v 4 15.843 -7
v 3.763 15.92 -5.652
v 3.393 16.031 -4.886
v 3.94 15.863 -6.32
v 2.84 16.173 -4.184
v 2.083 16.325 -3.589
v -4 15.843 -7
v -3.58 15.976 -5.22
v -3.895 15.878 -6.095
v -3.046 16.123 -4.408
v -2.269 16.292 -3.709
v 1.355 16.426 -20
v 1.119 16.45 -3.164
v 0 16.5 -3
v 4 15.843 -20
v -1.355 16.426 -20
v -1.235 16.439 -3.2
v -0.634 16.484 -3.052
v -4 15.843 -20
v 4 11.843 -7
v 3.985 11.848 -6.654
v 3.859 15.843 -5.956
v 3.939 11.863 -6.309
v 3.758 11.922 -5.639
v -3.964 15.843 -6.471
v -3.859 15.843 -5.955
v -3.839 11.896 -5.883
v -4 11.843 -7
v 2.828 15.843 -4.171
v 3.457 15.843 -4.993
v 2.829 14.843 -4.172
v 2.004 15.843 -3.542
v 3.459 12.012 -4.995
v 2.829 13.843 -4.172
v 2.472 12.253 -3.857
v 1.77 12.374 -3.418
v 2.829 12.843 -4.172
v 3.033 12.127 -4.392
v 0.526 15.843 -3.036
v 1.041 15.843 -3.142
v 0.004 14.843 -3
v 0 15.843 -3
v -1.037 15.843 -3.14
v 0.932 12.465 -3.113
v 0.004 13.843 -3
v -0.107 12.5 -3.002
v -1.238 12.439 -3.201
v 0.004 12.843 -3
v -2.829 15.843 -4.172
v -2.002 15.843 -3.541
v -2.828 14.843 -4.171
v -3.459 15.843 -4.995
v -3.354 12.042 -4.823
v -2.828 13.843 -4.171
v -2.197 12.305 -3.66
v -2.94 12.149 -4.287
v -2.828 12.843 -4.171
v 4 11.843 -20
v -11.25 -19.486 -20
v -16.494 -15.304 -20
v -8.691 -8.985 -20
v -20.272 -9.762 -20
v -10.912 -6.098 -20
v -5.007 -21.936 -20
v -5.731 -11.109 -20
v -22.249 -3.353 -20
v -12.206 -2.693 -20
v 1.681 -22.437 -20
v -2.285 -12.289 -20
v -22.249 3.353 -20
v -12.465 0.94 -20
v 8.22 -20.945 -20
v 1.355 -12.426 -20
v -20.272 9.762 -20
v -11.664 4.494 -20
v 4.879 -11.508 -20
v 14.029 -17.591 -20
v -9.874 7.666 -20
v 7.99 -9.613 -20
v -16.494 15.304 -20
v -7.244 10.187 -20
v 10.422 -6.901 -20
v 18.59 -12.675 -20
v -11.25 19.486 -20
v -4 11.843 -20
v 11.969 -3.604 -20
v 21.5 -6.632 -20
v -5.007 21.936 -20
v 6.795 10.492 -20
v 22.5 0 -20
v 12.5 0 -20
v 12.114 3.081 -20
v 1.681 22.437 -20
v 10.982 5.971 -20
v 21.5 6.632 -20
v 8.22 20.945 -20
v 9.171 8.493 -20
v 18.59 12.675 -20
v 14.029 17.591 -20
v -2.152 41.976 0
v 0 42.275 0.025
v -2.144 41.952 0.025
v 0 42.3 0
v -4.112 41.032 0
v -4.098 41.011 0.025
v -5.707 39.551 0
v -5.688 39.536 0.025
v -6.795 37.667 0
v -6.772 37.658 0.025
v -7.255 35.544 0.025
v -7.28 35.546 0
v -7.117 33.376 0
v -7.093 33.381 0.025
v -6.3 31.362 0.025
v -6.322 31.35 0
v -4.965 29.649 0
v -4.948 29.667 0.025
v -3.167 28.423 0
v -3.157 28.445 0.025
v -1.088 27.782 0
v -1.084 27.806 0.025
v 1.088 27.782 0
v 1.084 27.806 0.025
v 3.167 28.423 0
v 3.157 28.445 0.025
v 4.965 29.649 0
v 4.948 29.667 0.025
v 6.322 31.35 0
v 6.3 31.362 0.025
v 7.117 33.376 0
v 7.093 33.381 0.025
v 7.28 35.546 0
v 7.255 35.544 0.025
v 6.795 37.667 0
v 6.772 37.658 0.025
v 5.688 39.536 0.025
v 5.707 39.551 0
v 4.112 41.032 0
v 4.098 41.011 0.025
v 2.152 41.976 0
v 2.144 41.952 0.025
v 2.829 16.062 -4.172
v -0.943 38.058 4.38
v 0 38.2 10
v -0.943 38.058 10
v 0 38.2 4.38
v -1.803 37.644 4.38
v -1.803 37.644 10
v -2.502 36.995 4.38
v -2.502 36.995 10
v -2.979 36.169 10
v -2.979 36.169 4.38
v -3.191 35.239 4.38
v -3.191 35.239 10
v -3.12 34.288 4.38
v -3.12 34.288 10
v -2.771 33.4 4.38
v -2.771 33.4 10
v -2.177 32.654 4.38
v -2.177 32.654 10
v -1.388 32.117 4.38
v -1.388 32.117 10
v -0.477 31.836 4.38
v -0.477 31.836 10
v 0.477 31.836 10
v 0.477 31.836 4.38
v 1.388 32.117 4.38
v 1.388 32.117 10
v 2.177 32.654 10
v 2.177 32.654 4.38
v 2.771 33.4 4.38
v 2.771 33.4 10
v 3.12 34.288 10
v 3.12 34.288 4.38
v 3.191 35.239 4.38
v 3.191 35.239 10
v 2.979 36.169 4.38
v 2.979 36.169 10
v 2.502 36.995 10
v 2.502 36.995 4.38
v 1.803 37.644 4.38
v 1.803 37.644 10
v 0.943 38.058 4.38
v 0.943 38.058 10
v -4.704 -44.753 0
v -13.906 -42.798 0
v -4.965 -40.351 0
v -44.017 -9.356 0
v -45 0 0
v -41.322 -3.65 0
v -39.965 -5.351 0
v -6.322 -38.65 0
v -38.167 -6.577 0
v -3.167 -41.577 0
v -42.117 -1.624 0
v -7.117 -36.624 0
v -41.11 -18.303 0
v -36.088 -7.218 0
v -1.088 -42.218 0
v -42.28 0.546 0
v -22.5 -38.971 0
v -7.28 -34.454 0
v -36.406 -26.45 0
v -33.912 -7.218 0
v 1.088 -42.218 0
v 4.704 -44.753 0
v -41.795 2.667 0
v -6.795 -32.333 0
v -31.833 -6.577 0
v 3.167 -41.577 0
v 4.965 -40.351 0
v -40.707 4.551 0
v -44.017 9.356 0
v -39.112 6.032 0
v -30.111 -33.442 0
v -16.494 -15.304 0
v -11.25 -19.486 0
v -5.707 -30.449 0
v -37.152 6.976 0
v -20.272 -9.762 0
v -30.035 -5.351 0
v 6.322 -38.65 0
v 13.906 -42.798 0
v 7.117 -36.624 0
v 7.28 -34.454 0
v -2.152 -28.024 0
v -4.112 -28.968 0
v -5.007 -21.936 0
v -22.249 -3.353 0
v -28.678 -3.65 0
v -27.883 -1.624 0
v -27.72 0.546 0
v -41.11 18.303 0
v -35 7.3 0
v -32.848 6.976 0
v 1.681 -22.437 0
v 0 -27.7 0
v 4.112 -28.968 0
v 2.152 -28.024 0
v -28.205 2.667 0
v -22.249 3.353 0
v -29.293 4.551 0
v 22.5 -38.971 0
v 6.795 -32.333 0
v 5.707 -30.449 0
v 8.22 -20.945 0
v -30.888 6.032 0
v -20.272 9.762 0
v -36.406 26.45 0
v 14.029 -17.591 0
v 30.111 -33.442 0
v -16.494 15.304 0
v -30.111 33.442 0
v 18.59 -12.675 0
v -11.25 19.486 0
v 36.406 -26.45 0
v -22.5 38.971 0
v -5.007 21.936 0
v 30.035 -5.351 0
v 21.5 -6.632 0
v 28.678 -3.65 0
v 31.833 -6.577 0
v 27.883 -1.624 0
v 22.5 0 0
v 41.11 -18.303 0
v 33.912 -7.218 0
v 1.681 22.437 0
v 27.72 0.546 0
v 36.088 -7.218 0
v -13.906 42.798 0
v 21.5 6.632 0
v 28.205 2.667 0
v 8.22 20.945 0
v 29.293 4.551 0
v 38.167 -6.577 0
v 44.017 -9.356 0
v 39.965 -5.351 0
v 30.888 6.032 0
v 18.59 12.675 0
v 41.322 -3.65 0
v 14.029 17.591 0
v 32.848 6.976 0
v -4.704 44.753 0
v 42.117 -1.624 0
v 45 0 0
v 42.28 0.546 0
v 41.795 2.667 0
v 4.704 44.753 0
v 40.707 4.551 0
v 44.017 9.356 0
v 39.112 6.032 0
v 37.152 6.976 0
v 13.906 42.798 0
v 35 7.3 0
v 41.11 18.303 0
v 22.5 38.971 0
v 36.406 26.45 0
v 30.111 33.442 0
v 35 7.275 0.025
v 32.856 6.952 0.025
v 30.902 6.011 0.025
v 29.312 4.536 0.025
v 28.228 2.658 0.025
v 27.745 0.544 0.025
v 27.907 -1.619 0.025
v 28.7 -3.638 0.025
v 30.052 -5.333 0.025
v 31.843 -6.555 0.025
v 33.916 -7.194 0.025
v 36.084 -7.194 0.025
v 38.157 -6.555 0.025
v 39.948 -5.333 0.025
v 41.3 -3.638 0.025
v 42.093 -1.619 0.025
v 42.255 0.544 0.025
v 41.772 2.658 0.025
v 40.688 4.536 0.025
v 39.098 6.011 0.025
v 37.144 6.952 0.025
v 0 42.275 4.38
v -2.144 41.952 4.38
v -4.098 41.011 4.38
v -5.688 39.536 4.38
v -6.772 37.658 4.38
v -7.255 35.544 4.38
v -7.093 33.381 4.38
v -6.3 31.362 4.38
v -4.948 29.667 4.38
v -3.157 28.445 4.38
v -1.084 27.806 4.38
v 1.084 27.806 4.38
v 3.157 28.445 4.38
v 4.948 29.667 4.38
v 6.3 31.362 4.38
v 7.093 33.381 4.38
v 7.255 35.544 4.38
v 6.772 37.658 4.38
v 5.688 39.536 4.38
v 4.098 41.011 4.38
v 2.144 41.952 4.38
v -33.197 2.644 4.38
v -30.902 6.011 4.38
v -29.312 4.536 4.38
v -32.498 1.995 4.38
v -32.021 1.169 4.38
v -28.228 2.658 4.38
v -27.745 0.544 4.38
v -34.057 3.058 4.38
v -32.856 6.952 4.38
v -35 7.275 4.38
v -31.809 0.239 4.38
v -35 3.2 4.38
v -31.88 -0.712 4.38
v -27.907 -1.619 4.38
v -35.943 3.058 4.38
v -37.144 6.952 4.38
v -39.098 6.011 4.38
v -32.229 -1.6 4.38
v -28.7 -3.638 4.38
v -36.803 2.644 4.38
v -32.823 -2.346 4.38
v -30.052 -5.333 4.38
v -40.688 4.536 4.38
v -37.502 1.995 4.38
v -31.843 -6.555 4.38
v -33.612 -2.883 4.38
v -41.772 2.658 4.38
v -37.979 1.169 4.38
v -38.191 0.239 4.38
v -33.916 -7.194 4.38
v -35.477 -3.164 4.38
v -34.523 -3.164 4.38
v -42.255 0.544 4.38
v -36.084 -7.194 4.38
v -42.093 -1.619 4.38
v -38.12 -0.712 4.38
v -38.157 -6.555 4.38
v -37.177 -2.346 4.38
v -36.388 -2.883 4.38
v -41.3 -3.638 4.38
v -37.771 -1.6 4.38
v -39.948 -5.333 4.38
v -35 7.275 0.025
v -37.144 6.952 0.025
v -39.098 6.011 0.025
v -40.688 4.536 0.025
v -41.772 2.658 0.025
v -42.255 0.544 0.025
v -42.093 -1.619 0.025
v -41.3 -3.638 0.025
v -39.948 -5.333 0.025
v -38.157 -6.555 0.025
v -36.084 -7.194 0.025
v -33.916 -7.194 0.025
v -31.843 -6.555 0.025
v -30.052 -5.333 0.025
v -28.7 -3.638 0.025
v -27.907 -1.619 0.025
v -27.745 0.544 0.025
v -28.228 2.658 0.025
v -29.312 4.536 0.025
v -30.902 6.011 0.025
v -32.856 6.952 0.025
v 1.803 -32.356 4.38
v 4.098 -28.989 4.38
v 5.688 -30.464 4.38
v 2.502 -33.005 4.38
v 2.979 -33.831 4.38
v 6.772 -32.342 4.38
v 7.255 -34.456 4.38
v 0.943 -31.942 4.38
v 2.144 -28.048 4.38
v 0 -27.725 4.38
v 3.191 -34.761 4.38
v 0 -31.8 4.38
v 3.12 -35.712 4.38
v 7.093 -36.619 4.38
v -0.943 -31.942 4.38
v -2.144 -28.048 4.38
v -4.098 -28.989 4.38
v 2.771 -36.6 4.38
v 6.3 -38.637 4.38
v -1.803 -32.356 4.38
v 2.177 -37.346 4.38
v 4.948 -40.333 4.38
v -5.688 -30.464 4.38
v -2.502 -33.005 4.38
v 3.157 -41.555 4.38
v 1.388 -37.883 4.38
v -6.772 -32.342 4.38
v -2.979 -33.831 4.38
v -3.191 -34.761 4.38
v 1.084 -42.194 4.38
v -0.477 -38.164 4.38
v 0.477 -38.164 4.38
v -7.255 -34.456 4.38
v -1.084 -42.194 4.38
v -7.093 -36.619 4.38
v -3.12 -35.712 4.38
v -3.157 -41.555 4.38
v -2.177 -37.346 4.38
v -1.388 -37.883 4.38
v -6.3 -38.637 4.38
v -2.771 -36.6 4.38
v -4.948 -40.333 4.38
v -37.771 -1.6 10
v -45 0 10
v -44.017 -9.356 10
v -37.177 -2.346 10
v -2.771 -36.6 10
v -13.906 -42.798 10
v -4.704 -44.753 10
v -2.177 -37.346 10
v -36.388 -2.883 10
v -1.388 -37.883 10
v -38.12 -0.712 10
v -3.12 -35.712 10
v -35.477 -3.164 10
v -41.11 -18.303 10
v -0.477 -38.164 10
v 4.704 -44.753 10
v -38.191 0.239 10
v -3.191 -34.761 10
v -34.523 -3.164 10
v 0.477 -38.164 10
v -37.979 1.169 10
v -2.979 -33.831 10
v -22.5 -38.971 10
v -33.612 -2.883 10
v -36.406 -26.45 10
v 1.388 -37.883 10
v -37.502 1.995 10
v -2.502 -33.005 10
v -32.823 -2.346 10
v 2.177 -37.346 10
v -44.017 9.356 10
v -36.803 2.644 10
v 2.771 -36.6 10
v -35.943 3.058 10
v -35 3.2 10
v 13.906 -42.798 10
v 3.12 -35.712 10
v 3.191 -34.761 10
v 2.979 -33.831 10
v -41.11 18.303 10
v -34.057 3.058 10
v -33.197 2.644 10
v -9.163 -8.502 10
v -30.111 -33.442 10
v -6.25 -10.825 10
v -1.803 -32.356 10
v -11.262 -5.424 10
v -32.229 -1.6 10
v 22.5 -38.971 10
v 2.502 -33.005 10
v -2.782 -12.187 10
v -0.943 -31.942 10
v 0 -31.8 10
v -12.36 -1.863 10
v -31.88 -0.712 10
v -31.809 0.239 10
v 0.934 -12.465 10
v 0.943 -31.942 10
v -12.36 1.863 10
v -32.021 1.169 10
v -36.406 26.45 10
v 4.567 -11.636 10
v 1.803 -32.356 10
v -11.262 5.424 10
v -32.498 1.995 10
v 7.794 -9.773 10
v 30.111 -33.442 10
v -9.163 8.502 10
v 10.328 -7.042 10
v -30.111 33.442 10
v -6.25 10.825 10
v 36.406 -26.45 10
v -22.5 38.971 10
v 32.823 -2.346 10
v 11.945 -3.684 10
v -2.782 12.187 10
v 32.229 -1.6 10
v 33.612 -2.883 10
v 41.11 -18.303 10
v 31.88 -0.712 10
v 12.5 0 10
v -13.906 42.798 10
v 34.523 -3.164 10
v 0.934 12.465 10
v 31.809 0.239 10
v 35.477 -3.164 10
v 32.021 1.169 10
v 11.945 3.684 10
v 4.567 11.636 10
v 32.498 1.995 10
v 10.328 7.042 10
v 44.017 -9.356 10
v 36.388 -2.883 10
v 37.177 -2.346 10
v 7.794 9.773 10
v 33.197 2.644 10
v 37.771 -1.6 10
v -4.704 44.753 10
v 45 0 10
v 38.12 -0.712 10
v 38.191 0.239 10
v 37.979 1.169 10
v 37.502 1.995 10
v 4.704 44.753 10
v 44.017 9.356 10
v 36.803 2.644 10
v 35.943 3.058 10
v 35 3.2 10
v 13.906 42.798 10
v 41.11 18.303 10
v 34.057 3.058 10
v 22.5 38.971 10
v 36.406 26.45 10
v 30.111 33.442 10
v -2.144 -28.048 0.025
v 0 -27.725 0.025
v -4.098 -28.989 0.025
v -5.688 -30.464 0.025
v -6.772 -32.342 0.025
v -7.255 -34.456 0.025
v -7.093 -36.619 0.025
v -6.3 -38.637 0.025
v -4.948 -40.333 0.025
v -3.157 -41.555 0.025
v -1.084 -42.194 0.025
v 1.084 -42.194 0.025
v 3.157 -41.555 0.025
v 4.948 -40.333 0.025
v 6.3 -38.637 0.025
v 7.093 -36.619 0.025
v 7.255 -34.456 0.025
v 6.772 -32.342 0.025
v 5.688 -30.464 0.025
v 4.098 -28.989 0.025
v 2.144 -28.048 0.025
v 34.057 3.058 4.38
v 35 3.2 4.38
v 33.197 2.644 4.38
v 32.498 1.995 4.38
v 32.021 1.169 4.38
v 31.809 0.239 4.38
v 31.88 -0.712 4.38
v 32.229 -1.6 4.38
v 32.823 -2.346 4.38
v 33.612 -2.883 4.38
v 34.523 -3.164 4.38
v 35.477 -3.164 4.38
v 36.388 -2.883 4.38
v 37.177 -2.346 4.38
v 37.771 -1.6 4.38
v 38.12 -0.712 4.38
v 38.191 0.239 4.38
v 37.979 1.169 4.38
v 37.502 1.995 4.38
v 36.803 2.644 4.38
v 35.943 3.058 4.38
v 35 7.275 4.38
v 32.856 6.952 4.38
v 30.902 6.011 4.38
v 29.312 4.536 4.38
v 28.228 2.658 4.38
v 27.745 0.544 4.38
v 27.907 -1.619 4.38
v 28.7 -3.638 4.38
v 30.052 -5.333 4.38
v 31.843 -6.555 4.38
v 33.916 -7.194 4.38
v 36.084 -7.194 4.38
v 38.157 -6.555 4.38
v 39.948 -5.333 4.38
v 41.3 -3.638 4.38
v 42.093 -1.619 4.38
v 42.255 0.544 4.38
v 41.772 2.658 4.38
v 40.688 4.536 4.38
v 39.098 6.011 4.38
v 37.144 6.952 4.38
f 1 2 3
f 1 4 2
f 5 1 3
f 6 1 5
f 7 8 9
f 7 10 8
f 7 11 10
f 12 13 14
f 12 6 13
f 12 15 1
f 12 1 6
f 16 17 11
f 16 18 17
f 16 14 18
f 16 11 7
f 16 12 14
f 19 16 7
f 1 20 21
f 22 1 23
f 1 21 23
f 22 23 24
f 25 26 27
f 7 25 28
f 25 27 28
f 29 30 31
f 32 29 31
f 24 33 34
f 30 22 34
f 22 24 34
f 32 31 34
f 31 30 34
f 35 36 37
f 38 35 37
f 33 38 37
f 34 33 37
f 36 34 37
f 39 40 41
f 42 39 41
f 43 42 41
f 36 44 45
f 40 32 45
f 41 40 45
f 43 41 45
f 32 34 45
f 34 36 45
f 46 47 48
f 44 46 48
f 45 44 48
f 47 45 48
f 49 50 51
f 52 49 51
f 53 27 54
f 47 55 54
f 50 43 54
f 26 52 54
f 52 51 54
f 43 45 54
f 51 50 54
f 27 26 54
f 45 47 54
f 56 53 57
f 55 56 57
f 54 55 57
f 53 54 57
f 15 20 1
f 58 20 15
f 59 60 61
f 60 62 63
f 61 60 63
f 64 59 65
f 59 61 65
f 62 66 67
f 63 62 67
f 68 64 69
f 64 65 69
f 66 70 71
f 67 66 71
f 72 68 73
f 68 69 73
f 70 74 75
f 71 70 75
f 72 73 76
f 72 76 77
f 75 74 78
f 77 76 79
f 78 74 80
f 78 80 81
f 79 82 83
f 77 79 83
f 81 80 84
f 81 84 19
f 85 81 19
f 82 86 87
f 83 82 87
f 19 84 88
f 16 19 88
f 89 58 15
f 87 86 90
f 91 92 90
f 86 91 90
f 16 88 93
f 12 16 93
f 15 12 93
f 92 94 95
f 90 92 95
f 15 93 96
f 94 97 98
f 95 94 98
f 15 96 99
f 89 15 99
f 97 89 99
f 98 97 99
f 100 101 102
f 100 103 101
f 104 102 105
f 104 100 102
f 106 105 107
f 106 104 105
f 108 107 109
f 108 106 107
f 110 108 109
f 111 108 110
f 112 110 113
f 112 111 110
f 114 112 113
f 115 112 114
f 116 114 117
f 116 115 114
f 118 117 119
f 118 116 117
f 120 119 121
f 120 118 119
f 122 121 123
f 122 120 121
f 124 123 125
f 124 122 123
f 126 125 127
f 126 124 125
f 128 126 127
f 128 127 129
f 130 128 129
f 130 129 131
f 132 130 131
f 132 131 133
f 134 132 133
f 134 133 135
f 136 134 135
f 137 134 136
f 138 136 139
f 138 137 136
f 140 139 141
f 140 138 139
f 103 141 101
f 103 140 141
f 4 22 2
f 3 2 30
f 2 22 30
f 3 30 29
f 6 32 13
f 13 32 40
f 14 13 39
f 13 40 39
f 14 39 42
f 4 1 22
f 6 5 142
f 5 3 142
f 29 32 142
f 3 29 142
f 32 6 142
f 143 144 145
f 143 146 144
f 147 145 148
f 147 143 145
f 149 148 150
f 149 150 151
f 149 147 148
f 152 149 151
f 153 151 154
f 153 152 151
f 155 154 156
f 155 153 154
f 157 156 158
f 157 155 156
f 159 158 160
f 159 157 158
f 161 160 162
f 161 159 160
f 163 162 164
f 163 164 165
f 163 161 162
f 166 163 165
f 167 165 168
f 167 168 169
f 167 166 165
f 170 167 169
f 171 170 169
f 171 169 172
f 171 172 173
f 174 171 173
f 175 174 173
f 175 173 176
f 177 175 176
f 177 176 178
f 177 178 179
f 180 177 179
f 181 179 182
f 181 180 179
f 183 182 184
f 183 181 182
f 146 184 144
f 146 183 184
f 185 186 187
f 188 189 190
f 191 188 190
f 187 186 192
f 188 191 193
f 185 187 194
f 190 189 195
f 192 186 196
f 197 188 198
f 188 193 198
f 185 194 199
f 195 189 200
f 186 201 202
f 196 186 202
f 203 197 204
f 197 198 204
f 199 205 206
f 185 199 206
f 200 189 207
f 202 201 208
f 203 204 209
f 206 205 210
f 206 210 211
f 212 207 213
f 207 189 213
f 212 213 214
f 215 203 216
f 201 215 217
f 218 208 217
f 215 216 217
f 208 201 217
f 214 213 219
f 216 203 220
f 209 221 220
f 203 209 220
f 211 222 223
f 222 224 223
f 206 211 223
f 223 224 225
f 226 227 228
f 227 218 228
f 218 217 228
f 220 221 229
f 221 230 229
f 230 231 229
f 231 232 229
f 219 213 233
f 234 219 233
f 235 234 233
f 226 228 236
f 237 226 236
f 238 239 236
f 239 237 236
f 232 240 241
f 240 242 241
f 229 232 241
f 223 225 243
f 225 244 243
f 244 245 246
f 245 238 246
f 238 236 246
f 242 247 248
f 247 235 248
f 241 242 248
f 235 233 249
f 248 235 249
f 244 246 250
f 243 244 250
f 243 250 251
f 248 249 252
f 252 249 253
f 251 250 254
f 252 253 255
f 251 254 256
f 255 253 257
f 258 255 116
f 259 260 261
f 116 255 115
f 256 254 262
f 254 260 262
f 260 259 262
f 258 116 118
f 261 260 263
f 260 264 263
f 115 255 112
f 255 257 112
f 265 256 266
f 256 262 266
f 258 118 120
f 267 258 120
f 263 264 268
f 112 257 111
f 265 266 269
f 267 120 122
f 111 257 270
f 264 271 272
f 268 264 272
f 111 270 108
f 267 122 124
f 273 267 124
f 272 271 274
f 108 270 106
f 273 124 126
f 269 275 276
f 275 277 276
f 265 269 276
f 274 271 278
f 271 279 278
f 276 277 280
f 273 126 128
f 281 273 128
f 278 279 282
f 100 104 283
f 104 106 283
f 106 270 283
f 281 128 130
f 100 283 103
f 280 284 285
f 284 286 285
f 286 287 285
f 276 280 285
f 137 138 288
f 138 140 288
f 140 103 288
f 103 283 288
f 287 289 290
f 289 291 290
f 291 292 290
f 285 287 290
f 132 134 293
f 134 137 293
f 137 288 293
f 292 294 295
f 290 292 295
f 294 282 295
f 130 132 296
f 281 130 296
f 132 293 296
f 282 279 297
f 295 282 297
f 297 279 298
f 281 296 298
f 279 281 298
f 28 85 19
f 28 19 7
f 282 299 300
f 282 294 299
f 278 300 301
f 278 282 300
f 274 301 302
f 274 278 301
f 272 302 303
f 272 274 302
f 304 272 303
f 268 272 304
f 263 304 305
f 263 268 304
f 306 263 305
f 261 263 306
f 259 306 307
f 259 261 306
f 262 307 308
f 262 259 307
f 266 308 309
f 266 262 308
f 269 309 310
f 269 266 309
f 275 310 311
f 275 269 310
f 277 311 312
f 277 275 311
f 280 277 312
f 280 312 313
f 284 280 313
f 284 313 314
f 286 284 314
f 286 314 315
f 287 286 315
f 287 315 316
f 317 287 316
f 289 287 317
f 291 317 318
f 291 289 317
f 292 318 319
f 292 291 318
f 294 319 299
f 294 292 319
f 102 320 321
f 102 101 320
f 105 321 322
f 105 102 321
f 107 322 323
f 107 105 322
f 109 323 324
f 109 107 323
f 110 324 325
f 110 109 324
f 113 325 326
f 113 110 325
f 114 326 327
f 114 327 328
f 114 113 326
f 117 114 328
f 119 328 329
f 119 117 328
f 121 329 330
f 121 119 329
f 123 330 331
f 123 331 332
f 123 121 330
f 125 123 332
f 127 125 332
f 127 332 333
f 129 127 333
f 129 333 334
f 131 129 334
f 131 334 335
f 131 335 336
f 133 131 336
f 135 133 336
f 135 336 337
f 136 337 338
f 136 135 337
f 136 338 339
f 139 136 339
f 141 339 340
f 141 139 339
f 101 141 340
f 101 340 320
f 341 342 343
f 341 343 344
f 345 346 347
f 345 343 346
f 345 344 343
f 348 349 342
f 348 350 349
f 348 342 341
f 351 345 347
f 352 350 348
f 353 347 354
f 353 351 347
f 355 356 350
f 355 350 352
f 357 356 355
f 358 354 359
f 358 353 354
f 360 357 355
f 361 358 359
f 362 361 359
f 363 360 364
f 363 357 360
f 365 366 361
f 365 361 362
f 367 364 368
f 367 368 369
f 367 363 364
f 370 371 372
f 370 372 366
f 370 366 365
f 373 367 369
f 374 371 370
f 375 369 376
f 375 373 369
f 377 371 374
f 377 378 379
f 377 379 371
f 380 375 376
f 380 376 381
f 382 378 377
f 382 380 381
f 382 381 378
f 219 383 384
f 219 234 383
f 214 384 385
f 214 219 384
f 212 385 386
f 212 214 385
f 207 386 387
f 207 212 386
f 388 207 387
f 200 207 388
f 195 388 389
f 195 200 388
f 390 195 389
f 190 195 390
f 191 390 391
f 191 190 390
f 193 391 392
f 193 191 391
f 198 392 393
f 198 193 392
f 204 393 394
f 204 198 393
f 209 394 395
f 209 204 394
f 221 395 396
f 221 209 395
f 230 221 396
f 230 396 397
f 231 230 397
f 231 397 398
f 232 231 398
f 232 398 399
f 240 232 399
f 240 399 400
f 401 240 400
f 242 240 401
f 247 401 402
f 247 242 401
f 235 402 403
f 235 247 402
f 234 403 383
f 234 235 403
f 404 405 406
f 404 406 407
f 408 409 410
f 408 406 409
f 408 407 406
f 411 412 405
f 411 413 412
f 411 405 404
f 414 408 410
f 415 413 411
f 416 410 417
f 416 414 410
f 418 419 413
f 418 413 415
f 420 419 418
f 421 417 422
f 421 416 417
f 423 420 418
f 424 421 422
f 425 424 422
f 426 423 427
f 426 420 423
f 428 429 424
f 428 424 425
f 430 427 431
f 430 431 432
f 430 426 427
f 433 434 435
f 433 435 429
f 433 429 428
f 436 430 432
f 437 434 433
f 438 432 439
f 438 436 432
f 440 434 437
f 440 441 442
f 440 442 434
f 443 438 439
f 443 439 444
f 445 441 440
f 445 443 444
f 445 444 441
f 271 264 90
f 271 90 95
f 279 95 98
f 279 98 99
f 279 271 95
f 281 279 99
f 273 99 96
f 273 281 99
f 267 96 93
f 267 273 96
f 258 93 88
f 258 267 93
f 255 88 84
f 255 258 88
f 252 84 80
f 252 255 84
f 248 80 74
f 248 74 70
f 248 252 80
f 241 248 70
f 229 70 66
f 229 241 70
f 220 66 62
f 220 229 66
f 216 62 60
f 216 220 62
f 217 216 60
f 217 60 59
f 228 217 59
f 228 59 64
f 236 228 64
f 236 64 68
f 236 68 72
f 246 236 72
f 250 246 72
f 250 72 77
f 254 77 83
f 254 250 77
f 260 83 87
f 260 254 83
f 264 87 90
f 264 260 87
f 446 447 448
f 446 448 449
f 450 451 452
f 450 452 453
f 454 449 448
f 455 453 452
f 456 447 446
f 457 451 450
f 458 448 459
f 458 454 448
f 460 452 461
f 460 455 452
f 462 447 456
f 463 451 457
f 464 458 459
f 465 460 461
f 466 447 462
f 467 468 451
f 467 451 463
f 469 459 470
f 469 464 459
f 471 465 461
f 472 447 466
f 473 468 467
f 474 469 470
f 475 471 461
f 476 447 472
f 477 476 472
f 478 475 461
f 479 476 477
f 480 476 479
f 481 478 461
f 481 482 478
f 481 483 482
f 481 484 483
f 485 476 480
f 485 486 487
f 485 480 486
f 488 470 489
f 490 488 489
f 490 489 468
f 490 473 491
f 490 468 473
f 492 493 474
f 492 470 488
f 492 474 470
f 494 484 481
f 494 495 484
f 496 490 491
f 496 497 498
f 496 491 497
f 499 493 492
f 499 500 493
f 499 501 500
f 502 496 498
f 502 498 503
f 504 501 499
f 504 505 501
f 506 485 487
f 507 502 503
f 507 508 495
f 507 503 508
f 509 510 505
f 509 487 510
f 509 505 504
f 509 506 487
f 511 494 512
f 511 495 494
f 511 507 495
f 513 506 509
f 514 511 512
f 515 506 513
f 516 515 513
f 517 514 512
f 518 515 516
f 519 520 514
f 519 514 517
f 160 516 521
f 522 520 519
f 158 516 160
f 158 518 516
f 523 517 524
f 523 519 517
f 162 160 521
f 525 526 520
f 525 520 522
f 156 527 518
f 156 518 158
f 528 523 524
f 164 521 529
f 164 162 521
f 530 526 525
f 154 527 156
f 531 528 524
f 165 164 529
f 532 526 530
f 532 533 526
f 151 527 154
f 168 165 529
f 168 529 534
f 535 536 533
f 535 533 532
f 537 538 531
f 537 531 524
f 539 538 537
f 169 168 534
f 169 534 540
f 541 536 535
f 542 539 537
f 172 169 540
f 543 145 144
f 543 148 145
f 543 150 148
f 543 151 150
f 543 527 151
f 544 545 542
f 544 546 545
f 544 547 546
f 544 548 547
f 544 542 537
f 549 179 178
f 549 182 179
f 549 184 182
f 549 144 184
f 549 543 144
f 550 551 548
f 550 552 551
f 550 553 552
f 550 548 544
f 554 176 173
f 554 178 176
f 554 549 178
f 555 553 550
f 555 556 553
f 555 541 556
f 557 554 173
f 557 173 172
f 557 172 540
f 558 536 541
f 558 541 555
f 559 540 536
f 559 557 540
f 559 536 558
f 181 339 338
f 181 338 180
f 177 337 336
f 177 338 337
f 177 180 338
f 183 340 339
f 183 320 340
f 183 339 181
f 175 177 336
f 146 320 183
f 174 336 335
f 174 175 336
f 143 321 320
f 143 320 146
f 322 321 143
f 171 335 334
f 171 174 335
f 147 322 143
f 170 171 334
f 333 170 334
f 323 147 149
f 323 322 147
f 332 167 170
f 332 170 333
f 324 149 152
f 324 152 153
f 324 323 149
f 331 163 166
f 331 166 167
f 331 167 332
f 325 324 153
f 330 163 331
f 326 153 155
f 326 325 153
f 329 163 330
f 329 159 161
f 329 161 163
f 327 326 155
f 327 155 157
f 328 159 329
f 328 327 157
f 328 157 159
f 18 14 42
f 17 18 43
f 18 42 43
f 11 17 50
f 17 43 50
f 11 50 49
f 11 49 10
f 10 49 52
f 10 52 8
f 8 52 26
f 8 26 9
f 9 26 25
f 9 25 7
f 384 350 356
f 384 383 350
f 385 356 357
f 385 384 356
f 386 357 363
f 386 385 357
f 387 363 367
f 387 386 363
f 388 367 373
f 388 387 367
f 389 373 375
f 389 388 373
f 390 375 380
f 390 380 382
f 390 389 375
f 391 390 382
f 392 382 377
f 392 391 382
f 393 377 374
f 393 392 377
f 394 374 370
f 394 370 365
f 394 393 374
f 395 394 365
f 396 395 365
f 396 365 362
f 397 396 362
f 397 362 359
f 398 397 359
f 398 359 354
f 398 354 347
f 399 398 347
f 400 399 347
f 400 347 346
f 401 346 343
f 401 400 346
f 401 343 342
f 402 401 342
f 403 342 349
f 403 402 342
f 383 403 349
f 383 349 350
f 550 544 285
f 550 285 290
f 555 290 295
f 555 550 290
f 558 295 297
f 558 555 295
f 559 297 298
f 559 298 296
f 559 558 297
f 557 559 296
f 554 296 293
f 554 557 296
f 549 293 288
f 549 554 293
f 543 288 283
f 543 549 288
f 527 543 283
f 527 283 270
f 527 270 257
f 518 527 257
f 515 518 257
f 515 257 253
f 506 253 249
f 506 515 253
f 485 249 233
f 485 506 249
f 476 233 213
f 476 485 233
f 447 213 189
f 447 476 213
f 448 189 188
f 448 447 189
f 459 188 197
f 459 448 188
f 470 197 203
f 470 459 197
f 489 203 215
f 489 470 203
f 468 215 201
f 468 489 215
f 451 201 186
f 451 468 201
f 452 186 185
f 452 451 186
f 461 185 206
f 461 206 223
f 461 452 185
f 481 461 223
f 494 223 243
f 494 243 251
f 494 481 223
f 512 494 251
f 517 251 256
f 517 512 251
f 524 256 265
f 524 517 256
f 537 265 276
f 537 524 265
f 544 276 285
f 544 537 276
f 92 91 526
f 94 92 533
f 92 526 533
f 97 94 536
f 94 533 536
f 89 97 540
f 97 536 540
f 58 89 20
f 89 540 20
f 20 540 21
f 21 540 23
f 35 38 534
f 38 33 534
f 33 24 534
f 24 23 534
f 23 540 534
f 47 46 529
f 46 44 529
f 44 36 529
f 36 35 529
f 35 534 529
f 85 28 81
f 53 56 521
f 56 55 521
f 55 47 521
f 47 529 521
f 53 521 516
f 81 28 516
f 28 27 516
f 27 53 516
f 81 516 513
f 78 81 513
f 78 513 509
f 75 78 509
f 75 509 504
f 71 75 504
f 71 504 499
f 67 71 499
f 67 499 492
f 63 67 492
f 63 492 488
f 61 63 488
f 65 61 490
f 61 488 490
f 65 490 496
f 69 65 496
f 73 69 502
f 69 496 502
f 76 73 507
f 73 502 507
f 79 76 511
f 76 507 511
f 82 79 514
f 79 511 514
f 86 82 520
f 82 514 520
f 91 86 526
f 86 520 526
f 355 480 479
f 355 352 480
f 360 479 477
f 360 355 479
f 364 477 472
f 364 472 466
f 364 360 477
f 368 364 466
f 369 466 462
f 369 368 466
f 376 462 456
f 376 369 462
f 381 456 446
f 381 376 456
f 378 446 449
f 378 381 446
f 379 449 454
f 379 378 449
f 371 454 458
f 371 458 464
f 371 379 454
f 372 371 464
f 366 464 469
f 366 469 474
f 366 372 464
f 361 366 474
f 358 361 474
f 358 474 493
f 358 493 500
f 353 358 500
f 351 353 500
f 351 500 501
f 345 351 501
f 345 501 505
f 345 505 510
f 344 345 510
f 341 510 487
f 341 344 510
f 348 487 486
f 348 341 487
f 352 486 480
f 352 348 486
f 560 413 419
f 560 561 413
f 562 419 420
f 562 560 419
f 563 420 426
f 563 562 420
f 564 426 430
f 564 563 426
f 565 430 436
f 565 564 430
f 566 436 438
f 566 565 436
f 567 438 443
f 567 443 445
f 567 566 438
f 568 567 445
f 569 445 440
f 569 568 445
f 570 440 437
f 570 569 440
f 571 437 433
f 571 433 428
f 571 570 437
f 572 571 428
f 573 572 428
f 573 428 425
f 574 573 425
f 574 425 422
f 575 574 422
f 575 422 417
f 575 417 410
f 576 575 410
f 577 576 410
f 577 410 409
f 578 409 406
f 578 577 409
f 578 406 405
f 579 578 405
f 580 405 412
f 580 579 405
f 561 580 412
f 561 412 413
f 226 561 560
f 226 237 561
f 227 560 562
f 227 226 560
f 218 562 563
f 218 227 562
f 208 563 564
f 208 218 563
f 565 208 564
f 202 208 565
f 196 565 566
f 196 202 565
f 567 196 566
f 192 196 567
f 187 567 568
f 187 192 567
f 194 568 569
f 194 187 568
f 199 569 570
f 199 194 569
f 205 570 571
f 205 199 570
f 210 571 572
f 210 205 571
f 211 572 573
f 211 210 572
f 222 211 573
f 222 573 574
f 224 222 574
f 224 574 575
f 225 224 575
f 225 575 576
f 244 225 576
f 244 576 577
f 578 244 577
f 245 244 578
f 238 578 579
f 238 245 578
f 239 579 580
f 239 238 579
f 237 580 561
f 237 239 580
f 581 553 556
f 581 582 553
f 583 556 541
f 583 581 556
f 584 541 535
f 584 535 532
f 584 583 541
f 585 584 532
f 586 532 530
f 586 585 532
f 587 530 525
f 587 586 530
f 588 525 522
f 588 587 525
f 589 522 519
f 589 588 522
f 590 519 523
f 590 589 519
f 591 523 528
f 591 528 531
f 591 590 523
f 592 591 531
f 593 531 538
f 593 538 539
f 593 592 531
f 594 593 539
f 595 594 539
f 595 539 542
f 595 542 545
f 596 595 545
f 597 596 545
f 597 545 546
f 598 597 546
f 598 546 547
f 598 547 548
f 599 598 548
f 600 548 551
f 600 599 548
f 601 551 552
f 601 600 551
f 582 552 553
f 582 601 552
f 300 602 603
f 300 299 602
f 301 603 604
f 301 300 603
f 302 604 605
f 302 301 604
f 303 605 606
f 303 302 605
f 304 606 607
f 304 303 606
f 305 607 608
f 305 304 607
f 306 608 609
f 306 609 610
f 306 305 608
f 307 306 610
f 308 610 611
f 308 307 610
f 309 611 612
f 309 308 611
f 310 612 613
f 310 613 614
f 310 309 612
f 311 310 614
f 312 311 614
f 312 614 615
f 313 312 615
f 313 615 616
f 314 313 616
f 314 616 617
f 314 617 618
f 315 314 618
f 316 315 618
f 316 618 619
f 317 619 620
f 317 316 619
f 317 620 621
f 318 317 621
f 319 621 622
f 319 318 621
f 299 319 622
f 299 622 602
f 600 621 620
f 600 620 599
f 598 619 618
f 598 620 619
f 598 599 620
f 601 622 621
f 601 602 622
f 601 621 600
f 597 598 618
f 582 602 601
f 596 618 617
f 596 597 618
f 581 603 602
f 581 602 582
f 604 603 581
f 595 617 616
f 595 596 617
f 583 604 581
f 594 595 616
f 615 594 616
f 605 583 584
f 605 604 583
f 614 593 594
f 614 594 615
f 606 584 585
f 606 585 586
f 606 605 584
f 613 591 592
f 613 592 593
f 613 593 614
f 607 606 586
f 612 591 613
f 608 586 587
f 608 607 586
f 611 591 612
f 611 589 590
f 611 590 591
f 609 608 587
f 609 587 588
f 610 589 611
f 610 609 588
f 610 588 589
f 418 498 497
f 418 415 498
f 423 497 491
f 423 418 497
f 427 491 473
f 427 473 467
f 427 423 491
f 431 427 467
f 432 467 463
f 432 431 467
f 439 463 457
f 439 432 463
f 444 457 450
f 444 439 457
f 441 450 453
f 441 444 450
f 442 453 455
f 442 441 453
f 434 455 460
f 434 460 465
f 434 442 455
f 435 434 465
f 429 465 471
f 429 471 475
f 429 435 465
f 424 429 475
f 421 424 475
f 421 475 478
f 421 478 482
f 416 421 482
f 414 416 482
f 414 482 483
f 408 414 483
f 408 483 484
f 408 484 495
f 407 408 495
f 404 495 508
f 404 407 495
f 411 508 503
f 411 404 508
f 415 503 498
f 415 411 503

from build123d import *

# Parameters (mm, degrees)
SKETCH1_R                              = 22.5
SKETCH1_R_2                            = 12.5
BOSS_EXTRUDE1_DEPTH                    = 20
BOSS_EXTRUDE2_START                    = 10
SKETCH2_R                              = 45
SKETCH2_R_2                            = 12.5
BOSS_EXTRUDE2_DEPTH                    = 10
CUT_EXTRUDE1_START                     = 11
CUT_EXTRUDE1_DEPTH                     = 4.842719182
CUT_EXTRUDE1_START_2                   = -21
CUT_EXTRUDE1_2_DEPTH                   = 18.000002419
CUT_EXTRUDE1_START_3                   = 15.842719282
CUT_EXTRUDE1_3_DEPTH                   = 1.157280718
CBORE_FOR_M6_HEX_HEAD_BOLT1_AT_2_COUNT = 2
CBORE_FOR_M6_HEX_HEAD_BOLT1_AT_2_PITCH = 49.497474683
CBORE_FOR_M6_HEX_HEAD_BOLT1_AT_3_COUNT = 2
CBORE_FOR_M6_HEX_HEAD_BOLT1_AT_3_PITCH = 70
CBORE_FOR_M6_HEX_HEAD_BOLT1_AT_4_COUNT = 2
CBORE_FOR_M6_HEX_HEAD_BOLT1_AT_4_PITCH = 49.497474683


with BuildPart() as part:
    # Sketch1 → Boss-Extrude1 (new body)
    with BuildSketch(Plane.XY):
        Circle(SKETCH1_R)
        Circle(SKETCH1_R_2, mode=Mode.SUBTRACT)
    extrude(amount=-BOSS_EXTRUDE1_DEPTH)

    # Sketch2 → Boss-Extrude2 (add)
    with BuildSketch(Plane.XY.offset(BOSS_EXTRUDE2_START)):
        Circle(SKETCH2_R)
        Circle(SKETCH2_R_2, mode=Mode.SUBTRACT)
    extrude(amount=-BOSS_EXTRUDE2_DEPTH)

    # Cut-Extrude1: read off the stored shape, not the designer's step
    # Cut-Extrude1 outline → Cut-Extrude1 (cut)
    with BuildSketch(Plane(origin=(0, 0, 0), x_dir=(1, 0, 0), z_dir=(0, 1, 0)).offset(CUT_EXTRUDE1_START)):
        with BuildLine():
            add(Edge.make_bspline(
                [(4, 7), (4.000000645, 5.935618893), (3.56110042, 4.904383726), (2.096294231, 3.439297629), (1.055347946, 3.001083541), (-1.047099738, 2.998915861), (-2.090363581, 3.433909578), (-3.564946099, 4.907687175), (-4, 5.935522054), (-4, 6.999997575)],
                knots=[0, 0, 0, 0, 0.25, 0.25, 0.5, 0.5, 0.75, 0.75, 1, 1, 1, 1], degree=3))
            Line((4, 7), (4, 20))
            Line((4, 20), (-4, 20))
            Line((-4, 20), (-4, 6.999997575))
        make_face()
    extrude(amount=CUT_EXTRUDE1_DEPTH, mode=Mode.SUBTRACT)

    # Cut-Extrude1 2 outline → Cut-Extrude1 2 (cut)
    with BuildSketch(Plane.XY.offset(CUT_EXTRUDE1_START_2)):
        with BuildLine():
            Line((-4, 15.842719282), (4, 15.842719282))
            ThreePointArc((4, 15.842719282), (0, 16.5), (-4, 15.842719282))
        make_face()
    extrude(amount=CUT_EXTRUDE1_2_DEPTH, mode=Mode.SUBTRACT)

    # Cut-Extrude1 3 outline → Cut-Extrude1 3 (add)
    with BuildSketch(Plane(origin=(0, 0, 0), x_dir=(1, 0, 0), z_dir=(0, 1, 0)).offset(CUT_EXTRUDE1_START_3)):
        with BuildLine():
            Line((-4, 2.999997581), (0.000204294, 2.999997681))
            add(Edge.make_bspline(
                [(0.000204294, 2.999997681), (-1.049692709, 2.999997676), (-2.091279995, 3.434825492), (-3.564946099, 4.907687175), (-4, 5.935522054), (-4, 6.999997575)],
                knots=[0.500310737, 0.500310737, 0.500310737, 0.500310737, 0.75, 0.75, 1, 1, 1, 1], degree=3))
            Line((-4, 6.999997575), (-4, 2.999997581))
        make_face()
        with BuildLine():
            add(Edge.make_bspline(
                [(4, 7), (4.000000645, 5.935618893), (3.56110042, 4.904383726), (2.096294231, 3.439297629), (1.055347946, 3.001083541), (0.002817488, 2.999998354), (0.001510885, 2.999997681), (0.000204294, 2.999997681)],
                knots=[0, 0, 0, 0, 0.25, 0.25, 0.5, 0.5, 0.500310737, 0.500310737, 0.500310737, 0.500310737], degree=3))
            Line((0.000204294, 2.999997681), (4, 2.999997581))
            Line((4, 2.999997581), (4, 7))
        make_face()
    extrude(amount=CUT_EXTRUDE1_3_DEPTH)

    # Sketch5 → CBORE for M6 Hex Head Bolt1 (revolve, cut)
    with BuildSketch(Plane.YZ.offset(35)):
        Polygon((0, 0), (0, 10), (3.2, 10), (3.2, 4.38), (7.275, 4.38), (7.275, 0.025), (7.3, 0), align=None)
    cbore_for_m6_hex_head_bolt1 = revolve(axis=Axis((35, 0, -6.35), (0, 0, 1)), mode=Mode.SUBTRACT)

    # CBORE for M6 Hex Head Bolt1 at 2: CBORE for M6 Hex Head Bolt1 ×2
    with Locations(*[Vector(-0.7071067811865277, 0.7071067811865673, 0) * (i * CBORE_FOR_M6_HEX_HEAD_BOLT1_AT_2_PITCH) for i in range(1, CBORE_FOR_M6_HEX_HEAD_BOLT1_AT_2_COUNT)]):
        add(cbore_for_m6_hex_head_bolt1, mode=Mode.SUBTRACT)

    # CBORE for M6 Hex Head Bolt1 at 3: CBORE for M6 Hex Head Bolt1 ×2
    with Locations(*[(-i * CBORE_FOR_M6_HEX_HEAD_BOLT1_AT_3_PITCH, 0, 0) for i in range(1, CBORE_FOR_M6_HEX_HEAD_BOLT1_AT_3_COUNT)]):
        add(cbore_for_m6_hex_head_bolt1, mode=Mode.SUBTRACT)

    # CBORE for M6 Hex Head Bolt1 at 4: CBORE for M6 Hex Head Bolt1 ×2
    with Locations(*[Vector(-0.7071067811865674, -0.7071067811865276, 0) * (i * CBORE_FOR_M6_HEX_HEAD_BOLT1_AT_4_PITCH) for i in range(1, CBORE_FOR_M6_HEX_HEAD_BOLT1_AT_4_COUNT)]):
        add(cbore_for_m6_hex_head_bolt1, mode=Mode.SUBTRACT)


solid = part.part
